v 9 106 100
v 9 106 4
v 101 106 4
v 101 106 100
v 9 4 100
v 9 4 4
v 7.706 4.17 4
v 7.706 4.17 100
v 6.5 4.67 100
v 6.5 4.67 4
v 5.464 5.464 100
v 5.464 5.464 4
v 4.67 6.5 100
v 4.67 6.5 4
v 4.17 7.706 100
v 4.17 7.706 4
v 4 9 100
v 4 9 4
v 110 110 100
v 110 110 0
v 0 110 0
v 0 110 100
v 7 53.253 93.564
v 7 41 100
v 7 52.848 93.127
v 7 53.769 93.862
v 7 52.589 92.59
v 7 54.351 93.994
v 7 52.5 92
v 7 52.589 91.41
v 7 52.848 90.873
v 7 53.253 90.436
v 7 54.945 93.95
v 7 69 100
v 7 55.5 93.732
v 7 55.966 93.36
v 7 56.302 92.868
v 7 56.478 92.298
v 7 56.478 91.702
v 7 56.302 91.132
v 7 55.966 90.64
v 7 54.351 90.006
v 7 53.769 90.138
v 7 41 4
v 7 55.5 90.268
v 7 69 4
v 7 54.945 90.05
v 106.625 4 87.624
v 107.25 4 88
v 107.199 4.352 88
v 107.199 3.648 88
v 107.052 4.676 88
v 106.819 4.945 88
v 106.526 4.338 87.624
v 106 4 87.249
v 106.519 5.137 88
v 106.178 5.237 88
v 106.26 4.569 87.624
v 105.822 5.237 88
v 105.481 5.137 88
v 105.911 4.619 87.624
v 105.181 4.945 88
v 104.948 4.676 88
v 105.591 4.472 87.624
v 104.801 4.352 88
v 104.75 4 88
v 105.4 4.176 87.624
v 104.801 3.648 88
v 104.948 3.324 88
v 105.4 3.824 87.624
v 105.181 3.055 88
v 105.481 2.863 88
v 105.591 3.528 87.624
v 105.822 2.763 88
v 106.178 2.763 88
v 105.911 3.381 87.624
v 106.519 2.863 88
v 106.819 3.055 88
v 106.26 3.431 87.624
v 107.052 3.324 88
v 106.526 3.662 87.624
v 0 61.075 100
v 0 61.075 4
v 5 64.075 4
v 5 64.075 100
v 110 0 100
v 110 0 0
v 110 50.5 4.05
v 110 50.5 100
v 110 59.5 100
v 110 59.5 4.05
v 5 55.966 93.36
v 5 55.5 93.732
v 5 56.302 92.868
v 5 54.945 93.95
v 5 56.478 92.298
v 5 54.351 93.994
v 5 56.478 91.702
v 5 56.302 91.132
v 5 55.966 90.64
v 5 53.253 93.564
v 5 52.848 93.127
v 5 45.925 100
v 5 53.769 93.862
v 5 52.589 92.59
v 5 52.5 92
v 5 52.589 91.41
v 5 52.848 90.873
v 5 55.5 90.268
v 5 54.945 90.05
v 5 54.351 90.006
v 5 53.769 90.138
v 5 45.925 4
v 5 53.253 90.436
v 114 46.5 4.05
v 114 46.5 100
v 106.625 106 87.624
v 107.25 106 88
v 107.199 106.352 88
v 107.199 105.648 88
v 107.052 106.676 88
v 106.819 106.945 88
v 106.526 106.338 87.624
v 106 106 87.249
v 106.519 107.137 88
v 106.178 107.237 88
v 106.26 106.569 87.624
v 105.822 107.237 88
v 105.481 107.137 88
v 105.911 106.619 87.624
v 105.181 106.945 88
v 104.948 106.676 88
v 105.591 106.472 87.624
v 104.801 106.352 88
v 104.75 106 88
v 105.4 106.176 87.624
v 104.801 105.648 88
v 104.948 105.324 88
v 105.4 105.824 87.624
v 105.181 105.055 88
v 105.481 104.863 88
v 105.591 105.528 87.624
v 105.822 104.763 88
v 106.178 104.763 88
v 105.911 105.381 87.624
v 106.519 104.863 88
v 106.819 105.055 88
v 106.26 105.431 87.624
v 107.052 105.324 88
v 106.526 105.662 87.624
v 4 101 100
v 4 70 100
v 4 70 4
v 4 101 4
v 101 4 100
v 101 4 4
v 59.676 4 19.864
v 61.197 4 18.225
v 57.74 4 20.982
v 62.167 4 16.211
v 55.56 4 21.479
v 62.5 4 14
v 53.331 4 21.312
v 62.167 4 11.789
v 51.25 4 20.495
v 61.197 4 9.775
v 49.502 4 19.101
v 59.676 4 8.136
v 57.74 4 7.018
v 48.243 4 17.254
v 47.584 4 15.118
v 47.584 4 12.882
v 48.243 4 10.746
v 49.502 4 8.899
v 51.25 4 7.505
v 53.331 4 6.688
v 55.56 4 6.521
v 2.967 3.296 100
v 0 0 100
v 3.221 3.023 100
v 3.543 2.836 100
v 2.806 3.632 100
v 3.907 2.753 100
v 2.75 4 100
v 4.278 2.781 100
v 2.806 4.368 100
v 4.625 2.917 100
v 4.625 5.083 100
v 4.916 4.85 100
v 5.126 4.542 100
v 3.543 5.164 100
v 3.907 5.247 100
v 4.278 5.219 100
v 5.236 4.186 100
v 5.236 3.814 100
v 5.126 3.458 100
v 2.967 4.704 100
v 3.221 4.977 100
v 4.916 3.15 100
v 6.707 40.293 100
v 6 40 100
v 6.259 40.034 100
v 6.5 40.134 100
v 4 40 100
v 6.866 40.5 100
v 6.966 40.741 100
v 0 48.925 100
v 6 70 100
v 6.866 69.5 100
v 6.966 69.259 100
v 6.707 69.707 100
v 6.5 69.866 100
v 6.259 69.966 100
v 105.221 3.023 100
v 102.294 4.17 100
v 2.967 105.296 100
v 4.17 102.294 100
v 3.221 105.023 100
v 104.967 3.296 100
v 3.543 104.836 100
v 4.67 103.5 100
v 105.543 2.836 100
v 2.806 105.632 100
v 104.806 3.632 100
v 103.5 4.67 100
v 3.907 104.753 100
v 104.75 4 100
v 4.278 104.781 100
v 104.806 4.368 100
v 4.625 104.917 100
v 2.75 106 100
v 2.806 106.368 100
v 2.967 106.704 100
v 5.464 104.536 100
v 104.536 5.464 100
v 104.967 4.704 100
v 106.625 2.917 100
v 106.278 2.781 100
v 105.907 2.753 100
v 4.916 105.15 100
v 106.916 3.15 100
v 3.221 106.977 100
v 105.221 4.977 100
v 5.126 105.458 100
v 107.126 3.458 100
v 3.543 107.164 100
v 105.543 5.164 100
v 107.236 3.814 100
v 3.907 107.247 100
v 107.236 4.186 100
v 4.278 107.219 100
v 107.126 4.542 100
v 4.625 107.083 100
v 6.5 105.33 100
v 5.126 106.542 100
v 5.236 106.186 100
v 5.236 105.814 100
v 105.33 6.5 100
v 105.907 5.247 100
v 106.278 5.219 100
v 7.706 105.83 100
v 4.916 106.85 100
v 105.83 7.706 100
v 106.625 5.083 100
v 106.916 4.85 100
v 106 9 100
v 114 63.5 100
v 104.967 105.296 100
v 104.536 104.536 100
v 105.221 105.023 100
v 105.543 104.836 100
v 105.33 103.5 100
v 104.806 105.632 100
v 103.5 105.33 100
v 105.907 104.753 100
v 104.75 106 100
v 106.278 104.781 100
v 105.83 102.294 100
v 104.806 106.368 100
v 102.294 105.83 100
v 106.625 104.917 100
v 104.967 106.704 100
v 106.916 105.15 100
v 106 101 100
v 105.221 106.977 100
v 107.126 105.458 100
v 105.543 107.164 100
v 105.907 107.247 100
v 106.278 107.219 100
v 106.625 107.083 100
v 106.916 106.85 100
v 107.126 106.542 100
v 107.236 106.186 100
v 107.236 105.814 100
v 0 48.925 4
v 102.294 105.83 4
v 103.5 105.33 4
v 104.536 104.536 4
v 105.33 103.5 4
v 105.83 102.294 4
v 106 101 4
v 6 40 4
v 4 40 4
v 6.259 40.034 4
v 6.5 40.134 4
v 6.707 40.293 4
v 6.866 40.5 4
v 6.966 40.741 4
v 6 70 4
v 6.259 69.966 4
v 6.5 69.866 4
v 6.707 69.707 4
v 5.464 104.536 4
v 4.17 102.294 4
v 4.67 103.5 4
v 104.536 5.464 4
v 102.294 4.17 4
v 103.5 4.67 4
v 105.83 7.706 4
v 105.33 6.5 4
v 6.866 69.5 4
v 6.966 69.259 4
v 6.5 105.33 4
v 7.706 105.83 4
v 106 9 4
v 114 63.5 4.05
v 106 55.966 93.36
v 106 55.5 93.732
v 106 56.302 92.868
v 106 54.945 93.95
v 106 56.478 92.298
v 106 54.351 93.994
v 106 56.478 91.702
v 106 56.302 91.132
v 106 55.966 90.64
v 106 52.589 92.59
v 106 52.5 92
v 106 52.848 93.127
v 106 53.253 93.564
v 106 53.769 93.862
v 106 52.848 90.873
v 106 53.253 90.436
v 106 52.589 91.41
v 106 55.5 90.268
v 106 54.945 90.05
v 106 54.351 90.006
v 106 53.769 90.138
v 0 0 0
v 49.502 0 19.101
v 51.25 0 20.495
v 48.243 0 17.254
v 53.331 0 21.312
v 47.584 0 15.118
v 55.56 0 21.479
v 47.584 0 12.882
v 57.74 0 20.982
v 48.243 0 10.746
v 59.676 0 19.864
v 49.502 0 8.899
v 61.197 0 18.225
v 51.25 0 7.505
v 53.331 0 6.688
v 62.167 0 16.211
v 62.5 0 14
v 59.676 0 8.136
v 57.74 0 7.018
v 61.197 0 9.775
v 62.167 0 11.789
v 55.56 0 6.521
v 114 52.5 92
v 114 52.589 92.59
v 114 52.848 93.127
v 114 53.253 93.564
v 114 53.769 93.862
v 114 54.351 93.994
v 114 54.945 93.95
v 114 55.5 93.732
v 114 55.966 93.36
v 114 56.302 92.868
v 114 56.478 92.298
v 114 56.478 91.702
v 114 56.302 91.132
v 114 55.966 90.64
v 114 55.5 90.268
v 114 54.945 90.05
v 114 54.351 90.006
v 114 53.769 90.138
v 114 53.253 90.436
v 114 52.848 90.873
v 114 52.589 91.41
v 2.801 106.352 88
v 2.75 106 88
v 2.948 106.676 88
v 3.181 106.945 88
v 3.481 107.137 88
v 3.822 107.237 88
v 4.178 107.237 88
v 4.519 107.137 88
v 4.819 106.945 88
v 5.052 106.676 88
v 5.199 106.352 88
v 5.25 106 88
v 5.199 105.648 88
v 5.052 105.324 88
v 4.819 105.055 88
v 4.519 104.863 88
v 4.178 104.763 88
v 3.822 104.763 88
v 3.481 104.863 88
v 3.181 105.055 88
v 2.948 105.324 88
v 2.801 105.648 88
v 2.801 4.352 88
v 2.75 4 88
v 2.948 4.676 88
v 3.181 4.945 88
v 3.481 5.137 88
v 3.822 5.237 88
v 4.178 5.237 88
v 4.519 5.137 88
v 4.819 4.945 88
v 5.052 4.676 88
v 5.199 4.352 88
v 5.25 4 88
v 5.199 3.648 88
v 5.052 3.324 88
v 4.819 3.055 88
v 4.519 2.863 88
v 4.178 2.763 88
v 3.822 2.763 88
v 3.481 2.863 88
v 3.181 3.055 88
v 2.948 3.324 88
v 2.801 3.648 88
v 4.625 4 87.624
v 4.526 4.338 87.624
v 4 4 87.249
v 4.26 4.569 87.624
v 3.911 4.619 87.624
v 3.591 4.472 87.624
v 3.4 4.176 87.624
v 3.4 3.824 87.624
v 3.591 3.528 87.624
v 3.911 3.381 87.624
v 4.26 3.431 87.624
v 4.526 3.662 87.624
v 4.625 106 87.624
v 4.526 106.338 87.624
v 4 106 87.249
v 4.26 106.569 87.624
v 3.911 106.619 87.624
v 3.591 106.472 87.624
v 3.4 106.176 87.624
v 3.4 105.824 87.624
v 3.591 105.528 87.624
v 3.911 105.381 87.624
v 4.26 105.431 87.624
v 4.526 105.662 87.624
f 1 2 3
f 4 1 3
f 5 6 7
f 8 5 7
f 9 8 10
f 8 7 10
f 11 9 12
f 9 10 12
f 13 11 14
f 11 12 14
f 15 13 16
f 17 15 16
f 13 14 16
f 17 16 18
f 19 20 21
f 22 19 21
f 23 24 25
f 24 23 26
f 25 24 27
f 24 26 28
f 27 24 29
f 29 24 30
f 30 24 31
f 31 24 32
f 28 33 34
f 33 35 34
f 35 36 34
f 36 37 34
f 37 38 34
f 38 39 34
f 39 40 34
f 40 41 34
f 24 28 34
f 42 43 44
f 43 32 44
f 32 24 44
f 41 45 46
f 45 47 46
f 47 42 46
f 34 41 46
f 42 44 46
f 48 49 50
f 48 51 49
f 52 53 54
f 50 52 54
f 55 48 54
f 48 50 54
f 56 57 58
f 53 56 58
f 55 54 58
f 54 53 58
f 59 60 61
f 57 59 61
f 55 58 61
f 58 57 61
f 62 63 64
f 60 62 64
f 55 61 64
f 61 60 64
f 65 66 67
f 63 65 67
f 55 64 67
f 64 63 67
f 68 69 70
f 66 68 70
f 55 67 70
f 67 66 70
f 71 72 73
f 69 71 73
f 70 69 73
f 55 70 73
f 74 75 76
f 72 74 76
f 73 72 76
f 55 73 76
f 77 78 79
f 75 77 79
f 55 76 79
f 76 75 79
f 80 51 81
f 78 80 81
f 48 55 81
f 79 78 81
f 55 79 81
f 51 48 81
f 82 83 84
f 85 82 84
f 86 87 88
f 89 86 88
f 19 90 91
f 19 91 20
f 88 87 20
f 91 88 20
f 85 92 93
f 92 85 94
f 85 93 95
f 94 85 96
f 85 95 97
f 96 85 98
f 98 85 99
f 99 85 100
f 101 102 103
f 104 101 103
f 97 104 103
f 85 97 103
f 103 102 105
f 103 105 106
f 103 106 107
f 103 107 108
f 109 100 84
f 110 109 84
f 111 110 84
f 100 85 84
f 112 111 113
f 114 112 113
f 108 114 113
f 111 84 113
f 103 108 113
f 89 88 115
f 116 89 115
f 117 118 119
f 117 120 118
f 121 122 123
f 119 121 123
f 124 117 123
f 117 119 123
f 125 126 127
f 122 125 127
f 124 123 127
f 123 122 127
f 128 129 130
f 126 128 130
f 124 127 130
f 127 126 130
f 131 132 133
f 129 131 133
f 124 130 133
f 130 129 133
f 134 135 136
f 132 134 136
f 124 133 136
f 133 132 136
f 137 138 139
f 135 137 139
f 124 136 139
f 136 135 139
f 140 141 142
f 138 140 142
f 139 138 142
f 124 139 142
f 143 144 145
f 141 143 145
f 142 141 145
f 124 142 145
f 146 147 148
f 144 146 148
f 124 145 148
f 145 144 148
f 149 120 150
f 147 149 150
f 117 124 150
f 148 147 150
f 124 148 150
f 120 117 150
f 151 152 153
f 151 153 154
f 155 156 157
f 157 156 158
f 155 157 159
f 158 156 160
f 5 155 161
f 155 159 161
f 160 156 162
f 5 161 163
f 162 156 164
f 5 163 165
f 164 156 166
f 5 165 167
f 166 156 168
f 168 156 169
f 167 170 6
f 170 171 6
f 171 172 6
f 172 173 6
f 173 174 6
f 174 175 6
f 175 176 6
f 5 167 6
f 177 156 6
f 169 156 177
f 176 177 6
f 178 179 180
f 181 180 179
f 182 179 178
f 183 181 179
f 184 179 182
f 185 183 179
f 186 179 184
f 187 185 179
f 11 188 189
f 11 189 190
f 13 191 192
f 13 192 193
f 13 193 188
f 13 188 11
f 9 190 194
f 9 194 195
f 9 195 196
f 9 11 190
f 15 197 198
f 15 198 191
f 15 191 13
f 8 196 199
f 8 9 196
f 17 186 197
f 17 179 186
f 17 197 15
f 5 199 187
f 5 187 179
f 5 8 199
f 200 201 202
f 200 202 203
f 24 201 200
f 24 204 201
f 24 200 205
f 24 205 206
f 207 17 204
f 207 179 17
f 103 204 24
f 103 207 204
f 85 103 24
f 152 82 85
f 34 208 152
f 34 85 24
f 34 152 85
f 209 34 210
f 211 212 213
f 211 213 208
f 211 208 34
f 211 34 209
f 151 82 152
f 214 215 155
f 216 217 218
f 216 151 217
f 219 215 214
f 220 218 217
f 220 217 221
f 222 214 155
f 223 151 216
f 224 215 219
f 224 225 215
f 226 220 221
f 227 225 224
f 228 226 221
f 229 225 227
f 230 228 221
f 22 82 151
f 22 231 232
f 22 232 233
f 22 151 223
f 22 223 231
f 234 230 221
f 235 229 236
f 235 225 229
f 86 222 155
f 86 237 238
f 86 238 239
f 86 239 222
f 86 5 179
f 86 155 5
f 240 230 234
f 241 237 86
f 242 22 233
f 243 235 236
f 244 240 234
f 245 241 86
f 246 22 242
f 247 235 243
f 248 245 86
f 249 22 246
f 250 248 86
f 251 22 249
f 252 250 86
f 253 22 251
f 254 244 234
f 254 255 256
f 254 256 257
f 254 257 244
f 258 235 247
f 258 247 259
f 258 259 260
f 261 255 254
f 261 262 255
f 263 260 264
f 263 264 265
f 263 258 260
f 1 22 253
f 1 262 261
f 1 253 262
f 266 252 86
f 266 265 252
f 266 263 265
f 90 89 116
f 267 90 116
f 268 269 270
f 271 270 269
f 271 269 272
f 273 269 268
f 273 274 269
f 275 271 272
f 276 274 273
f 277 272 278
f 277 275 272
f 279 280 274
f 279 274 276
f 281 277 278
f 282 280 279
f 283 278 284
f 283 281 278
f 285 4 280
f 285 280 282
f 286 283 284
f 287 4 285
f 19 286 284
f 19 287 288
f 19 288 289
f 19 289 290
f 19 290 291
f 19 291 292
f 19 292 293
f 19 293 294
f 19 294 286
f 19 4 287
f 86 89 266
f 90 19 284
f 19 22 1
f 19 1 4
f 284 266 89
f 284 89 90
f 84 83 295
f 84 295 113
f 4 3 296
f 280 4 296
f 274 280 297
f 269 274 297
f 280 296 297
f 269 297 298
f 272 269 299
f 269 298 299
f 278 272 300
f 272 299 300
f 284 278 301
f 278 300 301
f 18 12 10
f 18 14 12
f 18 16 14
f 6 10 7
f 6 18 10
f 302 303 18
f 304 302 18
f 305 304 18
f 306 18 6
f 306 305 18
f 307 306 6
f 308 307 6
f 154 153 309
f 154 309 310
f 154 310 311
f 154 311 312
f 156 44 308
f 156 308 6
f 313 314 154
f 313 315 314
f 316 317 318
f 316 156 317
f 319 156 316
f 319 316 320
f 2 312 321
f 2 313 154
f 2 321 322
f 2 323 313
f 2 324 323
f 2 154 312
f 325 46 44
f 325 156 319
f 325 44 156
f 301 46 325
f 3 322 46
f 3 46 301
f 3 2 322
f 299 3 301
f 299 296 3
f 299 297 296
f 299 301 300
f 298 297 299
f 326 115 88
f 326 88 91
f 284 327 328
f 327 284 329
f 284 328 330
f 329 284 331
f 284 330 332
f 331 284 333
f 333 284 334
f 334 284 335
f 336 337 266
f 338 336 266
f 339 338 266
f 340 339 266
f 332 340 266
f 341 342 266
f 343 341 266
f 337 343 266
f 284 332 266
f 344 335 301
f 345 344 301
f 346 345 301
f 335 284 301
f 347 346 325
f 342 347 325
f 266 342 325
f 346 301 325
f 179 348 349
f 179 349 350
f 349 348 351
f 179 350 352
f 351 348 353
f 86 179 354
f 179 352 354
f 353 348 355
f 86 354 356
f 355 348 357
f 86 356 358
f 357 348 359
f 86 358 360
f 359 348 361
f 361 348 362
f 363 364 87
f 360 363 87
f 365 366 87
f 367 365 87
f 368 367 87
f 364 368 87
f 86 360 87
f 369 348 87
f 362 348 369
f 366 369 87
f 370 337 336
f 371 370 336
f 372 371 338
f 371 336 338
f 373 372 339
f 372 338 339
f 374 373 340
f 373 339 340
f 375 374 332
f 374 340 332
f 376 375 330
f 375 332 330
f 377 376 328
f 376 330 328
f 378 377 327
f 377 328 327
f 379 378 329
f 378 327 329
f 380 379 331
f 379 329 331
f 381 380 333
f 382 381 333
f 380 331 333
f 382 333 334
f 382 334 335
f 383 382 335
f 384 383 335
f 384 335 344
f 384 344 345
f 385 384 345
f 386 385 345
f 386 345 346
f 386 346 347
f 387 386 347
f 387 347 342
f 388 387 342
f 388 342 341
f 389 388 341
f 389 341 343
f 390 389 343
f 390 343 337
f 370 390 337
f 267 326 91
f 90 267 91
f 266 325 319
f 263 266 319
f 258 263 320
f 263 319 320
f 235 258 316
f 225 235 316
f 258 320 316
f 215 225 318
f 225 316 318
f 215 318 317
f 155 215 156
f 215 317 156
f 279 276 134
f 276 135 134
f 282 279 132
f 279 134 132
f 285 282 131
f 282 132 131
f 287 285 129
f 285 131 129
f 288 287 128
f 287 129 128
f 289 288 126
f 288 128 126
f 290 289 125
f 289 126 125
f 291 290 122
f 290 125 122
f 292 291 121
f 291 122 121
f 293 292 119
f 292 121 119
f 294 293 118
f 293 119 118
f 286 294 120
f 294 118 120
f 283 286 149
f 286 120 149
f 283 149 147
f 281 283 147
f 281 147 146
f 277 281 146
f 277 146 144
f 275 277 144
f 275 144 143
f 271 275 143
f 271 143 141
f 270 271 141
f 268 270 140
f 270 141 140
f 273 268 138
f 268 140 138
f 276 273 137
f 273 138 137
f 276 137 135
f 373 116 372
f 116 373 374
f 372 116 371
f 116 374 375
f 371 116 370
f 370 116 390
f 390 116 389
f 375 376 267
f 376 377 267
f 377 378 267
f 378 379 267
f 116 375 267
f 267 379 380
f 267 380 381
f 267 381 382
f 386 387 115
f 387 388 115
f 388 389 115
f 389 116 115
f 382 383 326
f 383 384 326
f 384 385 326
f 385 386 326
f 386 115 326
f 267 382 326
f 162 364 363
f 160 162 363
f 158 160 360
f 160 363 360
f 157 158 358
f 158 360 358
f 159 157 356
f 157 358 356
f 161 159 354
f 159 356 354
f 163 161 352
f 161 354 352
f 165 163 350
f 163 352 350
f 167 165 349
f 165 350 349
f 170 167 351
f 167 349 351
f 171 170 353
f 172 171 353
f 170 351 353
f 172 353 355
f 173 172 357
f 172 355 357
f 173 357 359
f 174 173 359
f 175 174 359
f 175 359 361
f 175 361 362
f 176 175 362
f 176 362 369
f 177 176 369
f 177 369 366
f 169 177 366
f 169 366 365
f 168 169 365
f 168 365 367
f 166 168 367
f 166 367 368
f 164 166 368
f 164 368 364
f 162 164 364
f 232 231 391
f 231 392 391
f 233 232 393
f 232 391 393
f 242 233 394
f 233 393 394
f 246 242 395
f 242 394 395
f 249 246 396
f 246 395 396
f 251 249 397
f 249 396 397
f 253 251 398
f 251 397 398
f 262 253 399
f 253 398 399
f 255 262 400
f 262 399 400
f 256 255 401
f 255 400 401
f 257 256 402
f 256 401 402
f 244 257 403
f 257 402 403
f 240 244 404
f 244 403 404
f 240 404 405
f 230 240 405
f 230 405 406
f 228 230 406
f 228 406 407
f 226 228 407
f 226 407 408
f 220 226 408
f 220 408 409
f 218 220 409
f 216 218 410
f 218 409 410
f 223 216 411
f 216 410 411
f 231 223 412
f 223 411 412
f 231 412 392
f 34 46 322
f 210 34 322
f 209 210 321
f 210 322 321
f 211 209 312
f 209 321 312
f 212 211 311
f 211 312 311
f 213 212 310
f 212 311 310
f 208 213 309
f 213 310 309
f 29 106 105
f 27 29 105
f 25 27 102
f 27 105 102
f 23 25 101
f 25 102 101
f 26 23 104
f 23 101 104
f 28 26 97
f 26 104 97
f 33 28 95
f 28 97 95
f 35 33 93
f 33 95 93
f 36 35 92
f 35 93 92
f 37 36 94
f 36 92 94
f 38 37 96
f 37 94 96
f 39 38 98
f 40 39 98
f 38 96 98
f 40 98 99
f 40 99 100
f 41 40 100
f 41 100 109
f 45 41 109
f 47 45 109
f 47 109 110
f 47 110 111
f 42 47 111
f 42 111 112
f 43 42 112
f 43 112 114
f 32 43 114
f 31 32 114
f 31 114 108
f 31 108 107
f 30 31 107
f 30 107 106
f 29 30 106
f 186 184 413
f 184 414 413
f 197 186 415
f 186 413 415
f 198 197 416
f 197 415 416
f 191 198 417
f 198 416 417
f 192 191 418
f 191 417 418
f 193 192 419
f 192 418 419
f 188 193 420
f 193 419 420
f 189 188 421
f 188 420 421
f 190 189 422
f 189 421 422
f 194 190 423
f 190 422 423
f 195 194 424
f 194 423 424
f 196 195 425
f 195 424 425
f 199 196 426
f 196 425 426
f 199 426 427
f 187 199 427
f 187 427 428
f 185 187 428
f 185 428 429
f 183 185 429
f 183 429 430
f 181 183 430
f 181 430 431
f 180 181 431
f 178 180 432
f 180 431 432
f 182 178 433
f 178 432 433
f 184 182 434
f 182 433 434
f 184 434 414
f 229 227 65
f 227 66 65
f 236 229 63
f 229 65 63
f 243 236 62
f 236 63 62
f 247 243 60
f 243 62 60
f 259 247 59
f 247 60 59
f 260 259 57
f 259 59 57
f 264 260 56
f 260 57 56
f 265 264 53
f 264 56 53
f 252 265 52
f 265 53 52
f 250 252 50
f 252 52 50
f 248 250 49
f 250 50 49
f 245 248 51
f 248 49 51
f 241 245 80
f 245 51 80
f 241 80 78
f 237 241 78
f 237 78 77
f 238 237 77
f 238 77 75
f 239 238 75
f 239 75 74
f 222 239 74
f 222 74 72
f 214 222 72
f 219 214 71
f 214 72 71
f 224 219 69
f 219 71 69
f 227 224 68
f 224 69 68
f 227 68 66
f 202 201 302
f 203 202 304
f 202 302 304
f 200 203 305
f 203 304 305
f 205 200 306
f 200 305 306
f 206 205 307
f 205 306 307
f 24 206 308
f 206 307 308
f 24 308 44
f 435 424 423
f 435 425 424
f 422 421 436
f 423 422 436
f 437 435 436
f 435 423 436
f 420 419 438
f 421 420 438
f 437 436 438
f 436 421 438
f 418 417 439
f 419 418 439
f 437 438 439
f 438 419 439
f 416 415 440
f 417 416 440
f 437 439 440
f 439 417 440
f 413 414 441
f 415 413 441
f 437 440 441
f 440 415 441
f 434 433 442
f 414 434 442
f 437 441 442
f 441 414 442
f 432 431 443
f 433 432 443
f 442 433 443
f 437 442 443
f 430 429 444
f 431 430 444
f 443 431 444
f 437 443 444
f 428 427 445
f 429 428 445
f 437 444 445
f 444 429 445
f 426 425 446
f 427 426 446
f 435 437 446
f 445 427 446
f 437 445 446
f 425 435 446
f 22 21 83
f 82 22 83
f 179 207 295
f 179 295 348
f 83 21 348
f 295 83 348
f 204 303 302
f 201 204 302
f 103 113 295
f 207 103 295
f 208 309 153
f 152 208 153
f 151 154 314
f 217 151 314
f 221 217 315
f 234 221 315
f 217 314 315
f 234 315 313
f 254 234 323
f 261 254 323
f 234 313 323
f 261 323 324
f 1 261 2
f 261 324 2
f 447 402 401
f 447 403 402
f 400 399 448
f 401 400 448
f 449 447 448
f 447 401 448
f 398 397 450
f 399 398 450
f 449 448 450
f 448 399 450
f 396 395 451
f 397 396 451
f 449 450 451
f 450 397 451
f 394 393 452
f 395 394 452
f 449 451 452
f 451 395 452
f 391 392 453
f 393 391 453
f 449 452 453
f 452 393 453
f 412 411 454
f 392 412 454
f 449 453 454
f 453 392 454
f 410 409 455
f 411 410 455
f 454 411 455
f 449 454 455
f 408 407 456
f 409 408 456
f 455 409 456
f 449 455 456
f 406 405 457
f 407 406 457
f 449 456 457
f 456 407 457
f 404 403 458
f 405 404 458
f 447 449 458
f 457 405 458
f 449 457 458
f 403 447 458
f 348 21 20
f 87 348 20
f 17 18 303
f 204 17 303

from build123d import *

# Parameters (mm, degrees)
F1_DEPTH  = 100
F2_W      = 110
F2_H      = 110
F3_DEPTH  = 4
F4_W      = 17
F4_H      = 4.05
F5_DEPTH  = 4
F7_D      = 4
F8_R      = 7.5
F9_DEPTH  = 25
F11_D     = 2.5
F11_DEPTH = 12
F11_TIP   = 0.7510757738


with BuildPart() as f1:
    # F0 (on Top) → F1 (new body)
    with BuildSketch(Plane.XY):
        Polygon((0, 48.925), (0, 0), (110, 0), (110, 50.5), (114, 46.5), (114, 63.5), (110, 59.5), (110, 110), (0, 110), (0, 61.075), (5, 64.075), (5, 45.925), align=None)
        with BuildLine():
            ThreePointArc((4, 101), (5.4644660941, 104.5355339059), (9, 106))
            Line((9, 106), (101, 106))
            ThreePointArc((101, 106), (104.5355339059, 104.5355339059), (106, 101))
            Line((106, 101), (106, 9))
            ThreePointArc((106, 9), (104.5355339059, 5.4644660941), (101, 4))
            Line((101, 4), (9, 4))
            ThreePointArc((9, 4), (5.4644660941, 5.4644660941), (4, 9))
            Line((4, 9), (4, 40))
            Line((4, 40), (6, 40))
            ThreePointArc((6, 40), (6.7071067812, 40.2928932188), (7, 41))
            Line((7, 41), (7, 69))
            ThreePointArc((7, 69), (6.7071067812, 69.7071067812), (6, 70))
            Line((6, 70), (4, 70))
            Line((4, 70), (4, 101))
        make_face(mode=Mode.SUBTRACT)
    extrude(amount=F1_DEPTH)

    # F2 (on Top) → F3 (join)
    with BuildSketch(Plane.XY):
        with Locations((55, 55)):
            Rectangle(F2_W, F2_H)
    extrude(amount=F3_DEPTH)

    # F4 (on face) → F5 (cut)
    with BuildSketch(Plane.YZ.offset(114)):
        with Locations((55, 2.025)):
            Rectangle(F4_W, F4_H)
    extrude(amount=-F5_DEPTH, mode=Mode.SUBTRACT)

    # F7 (through all)
    with Locations(Plane.YZ.offset(114)):
        with Locations((54.5, 92)):
            Hole(F7_D / 2)

    # F8 (on face) → F9 (cut)
    with BuildSketch(Plane.XZ):
        with Locations((55, 14)):
            Circle(F8_R)
    extrude(amount=-F9_DEPTH, mode=Mode.SUBTRACT)

    # F11
    with Locations(Plane.XY.offset(100)):
        with Locations((4, 106), (106, 106), (106, 4), (4, 4)):
            Hole(F11_D / 2, depth=F11_DEPTH)
            with Locations((0, 0, -(F11_DEPTH + F11_TIP / 2))):  # 118° drill point
                Cone(0, F11_D / 2, F11_TIP, mode=Mode.SUBTRACT)


solid = f1.part
